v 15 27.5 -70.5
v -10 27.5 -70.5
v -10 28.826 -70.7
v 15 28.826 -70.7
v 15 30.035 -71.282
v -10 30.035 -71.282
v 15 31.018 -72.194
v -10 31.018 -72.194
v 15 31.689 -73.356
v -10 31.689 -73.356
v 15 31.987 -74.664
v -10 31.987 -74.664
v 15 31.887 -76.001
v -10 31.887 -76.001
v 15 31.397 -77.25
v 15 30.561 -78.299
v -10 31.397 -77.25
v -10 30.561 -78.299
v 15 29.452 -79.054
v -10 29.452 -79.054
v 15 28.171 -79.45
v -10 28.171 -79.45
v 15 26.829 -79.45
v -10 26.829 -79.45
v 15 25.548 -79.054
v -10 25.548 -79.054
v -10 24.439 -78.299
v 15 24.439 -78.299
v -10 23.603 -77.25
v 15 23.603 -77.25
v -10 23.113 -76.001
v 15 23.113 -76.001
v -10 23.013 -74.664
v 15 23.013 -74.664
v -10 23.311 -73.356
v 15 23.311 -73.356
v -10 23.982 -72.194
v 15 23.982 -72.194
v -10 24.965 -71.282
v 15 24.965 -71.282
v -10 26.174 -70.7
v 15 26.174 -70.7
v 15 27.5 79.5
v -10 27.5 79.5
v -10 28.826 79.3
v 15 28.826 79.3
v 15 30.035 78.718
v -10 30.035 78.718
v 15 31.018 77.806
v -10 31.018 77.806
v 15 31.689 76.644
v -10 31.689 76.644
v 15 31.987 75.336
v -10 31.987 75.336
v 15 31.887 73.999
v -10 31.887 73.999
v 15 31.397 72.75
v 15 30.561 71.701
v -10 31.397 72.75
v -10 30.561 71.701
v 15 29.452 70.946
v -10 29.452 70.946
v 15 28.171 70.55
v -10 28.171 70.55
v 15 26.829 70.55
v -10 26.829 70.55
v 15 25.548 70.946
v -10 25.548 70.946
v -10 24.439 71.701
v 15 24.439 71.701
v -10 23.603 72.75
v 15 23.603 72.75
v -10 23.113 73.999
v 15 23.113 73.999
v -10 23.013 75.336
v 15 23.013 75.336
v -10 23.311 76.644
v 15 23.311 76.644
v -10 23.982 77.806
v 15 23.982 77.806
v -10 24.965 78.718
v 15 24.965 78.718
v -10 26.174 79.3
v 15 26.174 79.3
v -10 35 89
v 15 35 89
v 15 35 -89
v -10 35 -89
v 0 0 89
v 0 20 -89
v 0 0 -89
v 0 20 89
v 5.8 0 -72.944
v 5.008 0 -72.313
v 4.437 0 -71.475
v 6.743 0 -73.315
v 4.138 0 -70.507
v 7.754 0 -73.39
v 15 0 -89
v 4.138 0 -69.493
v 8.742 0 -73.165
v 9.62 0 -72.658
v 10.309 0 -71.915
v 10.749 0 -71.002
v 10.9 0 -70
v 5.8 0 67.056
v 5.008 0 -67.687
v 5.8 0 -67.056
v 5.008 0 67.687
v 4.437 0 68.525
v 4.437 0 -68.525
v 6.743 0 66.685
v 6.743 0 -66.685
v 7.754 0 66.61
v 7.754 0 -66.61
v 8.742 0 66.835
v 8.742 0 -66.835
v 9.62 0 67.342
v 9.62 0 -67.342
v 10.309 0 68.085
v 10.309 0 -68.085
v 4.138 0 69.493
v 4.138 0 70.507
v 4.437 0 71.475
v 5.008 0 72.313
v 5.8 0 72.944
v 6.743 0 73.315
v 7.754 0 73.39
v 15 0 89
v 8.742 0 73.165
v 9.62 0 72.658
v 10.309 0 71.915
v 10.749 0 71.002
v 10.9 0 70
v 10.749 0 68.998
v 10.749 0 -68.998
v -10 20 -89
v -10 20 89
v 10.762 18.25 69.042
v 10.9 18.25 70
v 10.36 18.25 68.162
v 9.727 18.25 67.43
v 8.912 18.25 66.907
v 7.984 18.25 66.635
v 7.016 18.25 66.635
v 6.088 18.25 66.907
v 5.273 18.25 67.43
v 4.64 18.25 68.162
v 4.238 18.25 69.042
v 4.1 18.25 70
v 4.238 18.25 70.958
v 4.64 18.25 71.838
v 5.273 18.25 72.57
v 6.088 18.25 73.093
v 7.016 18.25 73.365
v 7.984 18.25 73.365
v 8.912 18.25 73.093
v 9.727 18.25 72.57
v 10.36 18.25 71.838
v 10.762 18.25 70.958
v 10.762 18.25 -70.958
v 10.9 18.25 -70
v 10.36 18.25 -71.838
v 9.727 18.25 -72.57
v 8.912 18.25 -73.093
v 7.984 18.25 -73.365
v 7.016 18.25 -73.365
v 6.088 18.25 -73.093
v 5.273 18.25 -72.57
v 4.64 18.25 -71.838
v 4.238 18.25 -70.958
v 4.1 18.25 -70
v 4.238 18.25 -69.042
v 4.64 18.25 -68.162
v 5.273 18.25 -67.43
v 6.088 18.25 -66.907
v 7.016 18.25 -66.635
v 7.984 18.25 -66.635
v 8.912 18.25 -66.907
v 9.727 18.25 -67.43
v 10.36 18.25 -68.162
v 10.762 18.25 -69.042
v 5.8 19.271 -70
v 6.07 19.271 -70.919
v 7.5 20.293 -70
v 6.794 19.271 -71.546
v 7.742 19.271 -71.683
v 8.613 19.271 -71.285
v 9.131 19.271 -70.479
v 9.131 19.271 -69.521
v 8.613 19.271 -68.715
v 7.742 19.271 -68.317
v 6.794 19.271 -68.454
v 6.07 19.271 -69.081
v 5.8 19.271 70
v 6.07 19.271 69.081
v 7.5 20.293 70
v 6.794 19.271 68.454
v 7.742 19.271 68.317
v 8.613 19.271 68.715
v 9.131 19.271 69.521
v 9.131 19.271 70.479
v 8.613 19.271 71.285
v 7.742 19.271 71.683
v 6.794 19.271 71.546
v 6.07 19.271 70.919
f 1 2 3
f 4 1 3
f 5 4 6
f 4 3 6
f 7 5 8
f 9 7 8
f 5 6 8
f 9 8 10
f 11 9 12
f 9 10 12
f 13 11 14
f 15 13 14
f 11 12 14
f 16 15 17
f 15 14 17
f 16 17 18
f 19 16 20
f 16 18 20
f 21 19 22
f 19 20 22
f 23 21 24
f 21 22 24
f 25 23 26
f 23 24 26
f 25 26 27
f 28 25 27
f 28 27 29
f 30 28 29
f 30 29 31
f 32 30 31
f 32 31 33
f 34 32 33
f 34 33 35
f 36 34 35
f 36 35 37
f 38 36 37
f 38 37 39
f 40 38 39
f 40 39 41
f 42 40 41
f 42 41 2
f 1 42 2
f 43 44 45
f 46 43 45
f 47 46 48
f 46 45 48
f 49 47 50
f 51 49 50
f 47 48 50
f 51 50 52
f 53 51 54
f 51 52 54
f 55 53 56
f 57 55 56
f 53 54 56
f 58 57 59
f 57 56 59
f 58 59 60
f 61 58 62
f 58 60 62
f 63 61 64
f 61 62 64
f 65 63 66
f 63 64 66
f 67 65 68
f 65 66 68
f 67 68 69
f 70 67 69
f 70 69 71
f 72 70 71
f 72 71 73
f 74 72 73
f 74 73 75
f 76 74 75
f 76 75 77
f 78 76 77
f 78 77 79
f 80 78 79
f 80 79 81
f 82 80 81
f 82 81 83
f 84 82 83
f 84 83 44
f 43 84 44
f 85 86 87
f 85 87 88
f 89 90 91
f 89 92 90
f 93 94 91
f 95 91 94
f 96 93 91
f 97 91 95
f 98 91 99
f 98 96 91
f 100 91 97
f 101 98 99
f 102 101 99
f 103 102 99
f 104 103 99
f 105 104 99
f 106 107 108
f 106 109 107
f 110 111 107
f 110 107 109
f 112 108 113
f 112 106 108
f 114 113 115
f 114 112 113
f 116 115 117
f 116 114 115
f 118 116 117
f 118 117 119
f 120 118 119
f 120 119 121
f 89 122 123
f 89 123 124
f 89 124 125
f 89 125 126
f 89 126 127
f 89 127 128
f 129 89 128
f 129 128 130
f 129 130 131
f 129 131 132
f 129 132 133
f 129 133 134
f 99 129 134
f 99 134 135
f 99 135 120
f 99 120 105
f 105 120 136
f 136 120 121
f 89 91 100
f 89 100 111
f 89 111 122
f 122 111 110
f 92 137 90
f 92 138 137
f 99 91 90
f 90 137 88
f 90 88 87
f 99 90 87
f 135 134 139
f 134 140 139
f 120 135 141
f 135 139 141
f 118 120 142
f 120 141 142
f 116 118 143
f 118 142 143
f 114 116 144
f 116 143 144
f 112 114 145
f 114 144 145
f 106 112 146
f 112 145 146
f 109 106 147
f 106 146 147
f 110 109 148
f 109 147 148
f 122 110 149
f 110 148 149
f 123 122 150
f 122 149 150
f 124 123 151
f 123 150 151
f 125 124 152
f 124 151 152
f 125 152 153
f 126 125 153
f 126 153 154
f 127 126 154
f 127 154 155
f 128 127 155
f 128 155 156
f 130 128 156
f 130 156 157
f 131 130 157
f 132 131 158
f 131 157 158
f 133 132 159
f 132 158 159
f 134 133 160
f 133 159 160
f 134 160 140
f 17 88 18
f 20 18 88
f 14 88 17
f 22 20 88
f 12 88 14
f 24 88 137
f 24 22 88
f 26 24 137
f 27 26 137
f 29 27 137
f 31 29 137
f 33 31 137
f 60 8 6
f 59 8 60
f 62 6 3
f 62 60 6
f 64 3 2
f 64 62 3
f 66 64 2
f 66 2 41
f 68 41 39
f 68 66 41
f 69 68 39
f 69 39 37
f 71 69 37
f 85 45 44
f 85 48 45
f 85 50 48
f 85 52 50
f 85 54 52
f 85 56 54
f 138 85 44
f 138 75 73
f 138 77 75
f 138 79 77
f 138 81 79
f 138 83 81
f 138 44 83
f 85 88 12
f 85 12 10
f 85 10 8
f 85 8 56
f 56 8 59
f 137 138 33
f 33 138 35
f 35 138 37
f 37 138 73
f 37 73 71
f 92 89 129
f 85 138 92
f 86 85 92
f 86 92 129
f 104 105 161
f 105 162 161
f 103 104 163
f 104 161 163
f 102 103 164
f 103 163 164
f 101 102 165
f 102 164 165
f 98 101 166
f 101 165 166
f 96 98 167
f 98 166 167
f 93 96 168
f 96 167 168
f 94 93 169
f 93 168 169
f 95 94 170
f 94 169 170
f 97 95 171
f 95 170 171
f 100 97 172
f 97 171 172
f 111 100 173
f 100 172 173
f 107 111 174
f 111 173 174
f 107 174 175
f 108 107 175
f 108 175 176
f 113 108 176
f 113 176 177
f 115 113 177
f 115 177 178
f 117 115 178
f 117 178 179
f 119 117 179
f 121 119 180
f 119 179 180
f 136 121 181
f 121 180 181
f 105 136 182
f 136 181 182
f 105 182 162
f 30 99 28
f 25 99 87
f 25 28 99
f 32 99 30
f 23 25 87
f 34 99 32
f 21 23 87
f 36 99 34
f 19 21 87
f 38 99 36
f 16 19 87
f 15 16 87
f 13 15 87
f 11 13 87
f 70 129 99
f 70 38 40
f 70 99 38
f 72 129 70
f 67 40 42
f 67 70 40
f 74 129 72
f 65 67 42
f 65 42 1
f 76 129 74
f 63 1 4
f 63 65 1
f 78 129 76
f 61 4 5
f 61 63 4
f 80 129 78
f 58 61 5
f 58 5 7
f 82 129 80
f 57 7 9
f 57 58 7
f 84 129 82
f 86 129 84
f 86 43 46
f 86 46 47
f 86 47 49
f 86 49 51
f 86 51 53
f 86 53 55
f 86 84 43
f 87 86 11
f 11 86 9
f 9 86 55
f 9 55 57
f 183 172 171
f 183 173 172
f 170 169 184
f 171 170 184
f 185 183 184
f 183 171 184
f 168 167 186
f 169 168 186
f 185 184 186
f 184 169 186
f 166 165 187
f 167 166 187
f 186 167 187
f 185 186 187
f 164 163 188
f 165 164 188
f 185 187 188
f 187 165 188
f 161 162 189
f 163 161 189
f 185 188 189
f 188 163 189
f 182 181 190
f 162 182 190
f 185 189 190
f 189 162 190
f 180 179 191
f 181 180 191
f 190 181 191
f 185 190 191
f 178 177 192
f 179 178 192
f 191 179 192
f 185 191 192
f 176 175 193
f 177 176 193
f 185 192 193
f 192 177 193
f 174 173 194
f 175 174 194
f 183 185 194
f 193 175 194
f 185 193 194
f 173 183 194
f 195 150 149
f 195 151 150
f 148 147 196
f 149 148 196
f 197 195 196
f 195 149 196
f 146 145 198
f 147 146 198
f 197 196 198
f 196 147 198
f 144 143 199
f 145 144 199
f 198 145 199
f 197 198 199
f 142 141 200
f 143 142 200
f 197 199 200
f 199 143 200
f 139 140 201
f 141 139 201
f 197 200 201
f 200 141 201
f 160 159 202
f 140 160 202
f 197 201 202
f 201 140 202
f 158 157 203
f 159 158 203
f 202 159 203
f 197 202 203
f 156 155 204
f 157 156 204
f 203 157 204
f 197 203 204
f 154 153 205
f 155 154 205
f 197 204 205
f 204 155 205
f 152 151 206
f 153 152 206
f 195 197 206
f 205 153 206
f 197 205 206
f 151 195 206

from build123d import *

# Parameters (mm, degrees)
AUFSATZ_LINEAR_AUSTRAGEN1_DEPTH = 89
M8_GEWINDEBOHRUNG1_D            = 6.8
M8_GEWINDEBOHRUNG1_DEPTH        = 18.25
M8_GEWINDEBOHRUNG1_TIP          = 2.042926105
F_9_0_9_DURCHMESSER_BOHRUNG1_D  = 9


with BuildPart() as part:
    # Skizze1 → Aufsatz-Linear austragen1 (new, symmetric)
    with BuildSketch(Plane.XY):
        Polygon((0, 0), (15, 0), (15, 35), (-10, 35), (-10, 20), (0, 20), align=None)
    extrude(amount=AUFSATZ_LINEAR_AUSTRAGEN1_DEPTH, both=True)

    # M8 Gewindebohrung1
    with Locations(Plane(origin=(0, 0, 0), x_dir=(-1, 0, 0), z_dir=(0, -1, 0))):
        with Locations((-7.5, -70), (-7.5, 70)):
            Hole(M8_GEWINDEBOHRUNG1_D / 2, depth=M8_GEWINDEBOHRUNG1_DEPTH)
            with Locations((0, 0, -(M8_GEWINDEBOHRUNG1_DEPTH + M8_GEWINDEBOHRUNG1_TIP / 2))):  # 118° drill point
                Cone(0, M8_GEWINDEBOHRUNG1_D / 2, M8_GEWINDEBOHRUNG1_TIP, mode=Mode.SUBTRACT)

    # Ø9.0 (9) Durchmesser Bohrung1 (through all)
    with Locations(Plane(origin=(15, 0, 0), x_dir=(0, 0, -1), z_dir=(1, 0, 0))):
        with Locations((-75, 27.5), (75, 27.5)):
            Hole(F_9_0_9_DURCHMESSER_BOHRUNG1_D / 2)


solid = part.part
